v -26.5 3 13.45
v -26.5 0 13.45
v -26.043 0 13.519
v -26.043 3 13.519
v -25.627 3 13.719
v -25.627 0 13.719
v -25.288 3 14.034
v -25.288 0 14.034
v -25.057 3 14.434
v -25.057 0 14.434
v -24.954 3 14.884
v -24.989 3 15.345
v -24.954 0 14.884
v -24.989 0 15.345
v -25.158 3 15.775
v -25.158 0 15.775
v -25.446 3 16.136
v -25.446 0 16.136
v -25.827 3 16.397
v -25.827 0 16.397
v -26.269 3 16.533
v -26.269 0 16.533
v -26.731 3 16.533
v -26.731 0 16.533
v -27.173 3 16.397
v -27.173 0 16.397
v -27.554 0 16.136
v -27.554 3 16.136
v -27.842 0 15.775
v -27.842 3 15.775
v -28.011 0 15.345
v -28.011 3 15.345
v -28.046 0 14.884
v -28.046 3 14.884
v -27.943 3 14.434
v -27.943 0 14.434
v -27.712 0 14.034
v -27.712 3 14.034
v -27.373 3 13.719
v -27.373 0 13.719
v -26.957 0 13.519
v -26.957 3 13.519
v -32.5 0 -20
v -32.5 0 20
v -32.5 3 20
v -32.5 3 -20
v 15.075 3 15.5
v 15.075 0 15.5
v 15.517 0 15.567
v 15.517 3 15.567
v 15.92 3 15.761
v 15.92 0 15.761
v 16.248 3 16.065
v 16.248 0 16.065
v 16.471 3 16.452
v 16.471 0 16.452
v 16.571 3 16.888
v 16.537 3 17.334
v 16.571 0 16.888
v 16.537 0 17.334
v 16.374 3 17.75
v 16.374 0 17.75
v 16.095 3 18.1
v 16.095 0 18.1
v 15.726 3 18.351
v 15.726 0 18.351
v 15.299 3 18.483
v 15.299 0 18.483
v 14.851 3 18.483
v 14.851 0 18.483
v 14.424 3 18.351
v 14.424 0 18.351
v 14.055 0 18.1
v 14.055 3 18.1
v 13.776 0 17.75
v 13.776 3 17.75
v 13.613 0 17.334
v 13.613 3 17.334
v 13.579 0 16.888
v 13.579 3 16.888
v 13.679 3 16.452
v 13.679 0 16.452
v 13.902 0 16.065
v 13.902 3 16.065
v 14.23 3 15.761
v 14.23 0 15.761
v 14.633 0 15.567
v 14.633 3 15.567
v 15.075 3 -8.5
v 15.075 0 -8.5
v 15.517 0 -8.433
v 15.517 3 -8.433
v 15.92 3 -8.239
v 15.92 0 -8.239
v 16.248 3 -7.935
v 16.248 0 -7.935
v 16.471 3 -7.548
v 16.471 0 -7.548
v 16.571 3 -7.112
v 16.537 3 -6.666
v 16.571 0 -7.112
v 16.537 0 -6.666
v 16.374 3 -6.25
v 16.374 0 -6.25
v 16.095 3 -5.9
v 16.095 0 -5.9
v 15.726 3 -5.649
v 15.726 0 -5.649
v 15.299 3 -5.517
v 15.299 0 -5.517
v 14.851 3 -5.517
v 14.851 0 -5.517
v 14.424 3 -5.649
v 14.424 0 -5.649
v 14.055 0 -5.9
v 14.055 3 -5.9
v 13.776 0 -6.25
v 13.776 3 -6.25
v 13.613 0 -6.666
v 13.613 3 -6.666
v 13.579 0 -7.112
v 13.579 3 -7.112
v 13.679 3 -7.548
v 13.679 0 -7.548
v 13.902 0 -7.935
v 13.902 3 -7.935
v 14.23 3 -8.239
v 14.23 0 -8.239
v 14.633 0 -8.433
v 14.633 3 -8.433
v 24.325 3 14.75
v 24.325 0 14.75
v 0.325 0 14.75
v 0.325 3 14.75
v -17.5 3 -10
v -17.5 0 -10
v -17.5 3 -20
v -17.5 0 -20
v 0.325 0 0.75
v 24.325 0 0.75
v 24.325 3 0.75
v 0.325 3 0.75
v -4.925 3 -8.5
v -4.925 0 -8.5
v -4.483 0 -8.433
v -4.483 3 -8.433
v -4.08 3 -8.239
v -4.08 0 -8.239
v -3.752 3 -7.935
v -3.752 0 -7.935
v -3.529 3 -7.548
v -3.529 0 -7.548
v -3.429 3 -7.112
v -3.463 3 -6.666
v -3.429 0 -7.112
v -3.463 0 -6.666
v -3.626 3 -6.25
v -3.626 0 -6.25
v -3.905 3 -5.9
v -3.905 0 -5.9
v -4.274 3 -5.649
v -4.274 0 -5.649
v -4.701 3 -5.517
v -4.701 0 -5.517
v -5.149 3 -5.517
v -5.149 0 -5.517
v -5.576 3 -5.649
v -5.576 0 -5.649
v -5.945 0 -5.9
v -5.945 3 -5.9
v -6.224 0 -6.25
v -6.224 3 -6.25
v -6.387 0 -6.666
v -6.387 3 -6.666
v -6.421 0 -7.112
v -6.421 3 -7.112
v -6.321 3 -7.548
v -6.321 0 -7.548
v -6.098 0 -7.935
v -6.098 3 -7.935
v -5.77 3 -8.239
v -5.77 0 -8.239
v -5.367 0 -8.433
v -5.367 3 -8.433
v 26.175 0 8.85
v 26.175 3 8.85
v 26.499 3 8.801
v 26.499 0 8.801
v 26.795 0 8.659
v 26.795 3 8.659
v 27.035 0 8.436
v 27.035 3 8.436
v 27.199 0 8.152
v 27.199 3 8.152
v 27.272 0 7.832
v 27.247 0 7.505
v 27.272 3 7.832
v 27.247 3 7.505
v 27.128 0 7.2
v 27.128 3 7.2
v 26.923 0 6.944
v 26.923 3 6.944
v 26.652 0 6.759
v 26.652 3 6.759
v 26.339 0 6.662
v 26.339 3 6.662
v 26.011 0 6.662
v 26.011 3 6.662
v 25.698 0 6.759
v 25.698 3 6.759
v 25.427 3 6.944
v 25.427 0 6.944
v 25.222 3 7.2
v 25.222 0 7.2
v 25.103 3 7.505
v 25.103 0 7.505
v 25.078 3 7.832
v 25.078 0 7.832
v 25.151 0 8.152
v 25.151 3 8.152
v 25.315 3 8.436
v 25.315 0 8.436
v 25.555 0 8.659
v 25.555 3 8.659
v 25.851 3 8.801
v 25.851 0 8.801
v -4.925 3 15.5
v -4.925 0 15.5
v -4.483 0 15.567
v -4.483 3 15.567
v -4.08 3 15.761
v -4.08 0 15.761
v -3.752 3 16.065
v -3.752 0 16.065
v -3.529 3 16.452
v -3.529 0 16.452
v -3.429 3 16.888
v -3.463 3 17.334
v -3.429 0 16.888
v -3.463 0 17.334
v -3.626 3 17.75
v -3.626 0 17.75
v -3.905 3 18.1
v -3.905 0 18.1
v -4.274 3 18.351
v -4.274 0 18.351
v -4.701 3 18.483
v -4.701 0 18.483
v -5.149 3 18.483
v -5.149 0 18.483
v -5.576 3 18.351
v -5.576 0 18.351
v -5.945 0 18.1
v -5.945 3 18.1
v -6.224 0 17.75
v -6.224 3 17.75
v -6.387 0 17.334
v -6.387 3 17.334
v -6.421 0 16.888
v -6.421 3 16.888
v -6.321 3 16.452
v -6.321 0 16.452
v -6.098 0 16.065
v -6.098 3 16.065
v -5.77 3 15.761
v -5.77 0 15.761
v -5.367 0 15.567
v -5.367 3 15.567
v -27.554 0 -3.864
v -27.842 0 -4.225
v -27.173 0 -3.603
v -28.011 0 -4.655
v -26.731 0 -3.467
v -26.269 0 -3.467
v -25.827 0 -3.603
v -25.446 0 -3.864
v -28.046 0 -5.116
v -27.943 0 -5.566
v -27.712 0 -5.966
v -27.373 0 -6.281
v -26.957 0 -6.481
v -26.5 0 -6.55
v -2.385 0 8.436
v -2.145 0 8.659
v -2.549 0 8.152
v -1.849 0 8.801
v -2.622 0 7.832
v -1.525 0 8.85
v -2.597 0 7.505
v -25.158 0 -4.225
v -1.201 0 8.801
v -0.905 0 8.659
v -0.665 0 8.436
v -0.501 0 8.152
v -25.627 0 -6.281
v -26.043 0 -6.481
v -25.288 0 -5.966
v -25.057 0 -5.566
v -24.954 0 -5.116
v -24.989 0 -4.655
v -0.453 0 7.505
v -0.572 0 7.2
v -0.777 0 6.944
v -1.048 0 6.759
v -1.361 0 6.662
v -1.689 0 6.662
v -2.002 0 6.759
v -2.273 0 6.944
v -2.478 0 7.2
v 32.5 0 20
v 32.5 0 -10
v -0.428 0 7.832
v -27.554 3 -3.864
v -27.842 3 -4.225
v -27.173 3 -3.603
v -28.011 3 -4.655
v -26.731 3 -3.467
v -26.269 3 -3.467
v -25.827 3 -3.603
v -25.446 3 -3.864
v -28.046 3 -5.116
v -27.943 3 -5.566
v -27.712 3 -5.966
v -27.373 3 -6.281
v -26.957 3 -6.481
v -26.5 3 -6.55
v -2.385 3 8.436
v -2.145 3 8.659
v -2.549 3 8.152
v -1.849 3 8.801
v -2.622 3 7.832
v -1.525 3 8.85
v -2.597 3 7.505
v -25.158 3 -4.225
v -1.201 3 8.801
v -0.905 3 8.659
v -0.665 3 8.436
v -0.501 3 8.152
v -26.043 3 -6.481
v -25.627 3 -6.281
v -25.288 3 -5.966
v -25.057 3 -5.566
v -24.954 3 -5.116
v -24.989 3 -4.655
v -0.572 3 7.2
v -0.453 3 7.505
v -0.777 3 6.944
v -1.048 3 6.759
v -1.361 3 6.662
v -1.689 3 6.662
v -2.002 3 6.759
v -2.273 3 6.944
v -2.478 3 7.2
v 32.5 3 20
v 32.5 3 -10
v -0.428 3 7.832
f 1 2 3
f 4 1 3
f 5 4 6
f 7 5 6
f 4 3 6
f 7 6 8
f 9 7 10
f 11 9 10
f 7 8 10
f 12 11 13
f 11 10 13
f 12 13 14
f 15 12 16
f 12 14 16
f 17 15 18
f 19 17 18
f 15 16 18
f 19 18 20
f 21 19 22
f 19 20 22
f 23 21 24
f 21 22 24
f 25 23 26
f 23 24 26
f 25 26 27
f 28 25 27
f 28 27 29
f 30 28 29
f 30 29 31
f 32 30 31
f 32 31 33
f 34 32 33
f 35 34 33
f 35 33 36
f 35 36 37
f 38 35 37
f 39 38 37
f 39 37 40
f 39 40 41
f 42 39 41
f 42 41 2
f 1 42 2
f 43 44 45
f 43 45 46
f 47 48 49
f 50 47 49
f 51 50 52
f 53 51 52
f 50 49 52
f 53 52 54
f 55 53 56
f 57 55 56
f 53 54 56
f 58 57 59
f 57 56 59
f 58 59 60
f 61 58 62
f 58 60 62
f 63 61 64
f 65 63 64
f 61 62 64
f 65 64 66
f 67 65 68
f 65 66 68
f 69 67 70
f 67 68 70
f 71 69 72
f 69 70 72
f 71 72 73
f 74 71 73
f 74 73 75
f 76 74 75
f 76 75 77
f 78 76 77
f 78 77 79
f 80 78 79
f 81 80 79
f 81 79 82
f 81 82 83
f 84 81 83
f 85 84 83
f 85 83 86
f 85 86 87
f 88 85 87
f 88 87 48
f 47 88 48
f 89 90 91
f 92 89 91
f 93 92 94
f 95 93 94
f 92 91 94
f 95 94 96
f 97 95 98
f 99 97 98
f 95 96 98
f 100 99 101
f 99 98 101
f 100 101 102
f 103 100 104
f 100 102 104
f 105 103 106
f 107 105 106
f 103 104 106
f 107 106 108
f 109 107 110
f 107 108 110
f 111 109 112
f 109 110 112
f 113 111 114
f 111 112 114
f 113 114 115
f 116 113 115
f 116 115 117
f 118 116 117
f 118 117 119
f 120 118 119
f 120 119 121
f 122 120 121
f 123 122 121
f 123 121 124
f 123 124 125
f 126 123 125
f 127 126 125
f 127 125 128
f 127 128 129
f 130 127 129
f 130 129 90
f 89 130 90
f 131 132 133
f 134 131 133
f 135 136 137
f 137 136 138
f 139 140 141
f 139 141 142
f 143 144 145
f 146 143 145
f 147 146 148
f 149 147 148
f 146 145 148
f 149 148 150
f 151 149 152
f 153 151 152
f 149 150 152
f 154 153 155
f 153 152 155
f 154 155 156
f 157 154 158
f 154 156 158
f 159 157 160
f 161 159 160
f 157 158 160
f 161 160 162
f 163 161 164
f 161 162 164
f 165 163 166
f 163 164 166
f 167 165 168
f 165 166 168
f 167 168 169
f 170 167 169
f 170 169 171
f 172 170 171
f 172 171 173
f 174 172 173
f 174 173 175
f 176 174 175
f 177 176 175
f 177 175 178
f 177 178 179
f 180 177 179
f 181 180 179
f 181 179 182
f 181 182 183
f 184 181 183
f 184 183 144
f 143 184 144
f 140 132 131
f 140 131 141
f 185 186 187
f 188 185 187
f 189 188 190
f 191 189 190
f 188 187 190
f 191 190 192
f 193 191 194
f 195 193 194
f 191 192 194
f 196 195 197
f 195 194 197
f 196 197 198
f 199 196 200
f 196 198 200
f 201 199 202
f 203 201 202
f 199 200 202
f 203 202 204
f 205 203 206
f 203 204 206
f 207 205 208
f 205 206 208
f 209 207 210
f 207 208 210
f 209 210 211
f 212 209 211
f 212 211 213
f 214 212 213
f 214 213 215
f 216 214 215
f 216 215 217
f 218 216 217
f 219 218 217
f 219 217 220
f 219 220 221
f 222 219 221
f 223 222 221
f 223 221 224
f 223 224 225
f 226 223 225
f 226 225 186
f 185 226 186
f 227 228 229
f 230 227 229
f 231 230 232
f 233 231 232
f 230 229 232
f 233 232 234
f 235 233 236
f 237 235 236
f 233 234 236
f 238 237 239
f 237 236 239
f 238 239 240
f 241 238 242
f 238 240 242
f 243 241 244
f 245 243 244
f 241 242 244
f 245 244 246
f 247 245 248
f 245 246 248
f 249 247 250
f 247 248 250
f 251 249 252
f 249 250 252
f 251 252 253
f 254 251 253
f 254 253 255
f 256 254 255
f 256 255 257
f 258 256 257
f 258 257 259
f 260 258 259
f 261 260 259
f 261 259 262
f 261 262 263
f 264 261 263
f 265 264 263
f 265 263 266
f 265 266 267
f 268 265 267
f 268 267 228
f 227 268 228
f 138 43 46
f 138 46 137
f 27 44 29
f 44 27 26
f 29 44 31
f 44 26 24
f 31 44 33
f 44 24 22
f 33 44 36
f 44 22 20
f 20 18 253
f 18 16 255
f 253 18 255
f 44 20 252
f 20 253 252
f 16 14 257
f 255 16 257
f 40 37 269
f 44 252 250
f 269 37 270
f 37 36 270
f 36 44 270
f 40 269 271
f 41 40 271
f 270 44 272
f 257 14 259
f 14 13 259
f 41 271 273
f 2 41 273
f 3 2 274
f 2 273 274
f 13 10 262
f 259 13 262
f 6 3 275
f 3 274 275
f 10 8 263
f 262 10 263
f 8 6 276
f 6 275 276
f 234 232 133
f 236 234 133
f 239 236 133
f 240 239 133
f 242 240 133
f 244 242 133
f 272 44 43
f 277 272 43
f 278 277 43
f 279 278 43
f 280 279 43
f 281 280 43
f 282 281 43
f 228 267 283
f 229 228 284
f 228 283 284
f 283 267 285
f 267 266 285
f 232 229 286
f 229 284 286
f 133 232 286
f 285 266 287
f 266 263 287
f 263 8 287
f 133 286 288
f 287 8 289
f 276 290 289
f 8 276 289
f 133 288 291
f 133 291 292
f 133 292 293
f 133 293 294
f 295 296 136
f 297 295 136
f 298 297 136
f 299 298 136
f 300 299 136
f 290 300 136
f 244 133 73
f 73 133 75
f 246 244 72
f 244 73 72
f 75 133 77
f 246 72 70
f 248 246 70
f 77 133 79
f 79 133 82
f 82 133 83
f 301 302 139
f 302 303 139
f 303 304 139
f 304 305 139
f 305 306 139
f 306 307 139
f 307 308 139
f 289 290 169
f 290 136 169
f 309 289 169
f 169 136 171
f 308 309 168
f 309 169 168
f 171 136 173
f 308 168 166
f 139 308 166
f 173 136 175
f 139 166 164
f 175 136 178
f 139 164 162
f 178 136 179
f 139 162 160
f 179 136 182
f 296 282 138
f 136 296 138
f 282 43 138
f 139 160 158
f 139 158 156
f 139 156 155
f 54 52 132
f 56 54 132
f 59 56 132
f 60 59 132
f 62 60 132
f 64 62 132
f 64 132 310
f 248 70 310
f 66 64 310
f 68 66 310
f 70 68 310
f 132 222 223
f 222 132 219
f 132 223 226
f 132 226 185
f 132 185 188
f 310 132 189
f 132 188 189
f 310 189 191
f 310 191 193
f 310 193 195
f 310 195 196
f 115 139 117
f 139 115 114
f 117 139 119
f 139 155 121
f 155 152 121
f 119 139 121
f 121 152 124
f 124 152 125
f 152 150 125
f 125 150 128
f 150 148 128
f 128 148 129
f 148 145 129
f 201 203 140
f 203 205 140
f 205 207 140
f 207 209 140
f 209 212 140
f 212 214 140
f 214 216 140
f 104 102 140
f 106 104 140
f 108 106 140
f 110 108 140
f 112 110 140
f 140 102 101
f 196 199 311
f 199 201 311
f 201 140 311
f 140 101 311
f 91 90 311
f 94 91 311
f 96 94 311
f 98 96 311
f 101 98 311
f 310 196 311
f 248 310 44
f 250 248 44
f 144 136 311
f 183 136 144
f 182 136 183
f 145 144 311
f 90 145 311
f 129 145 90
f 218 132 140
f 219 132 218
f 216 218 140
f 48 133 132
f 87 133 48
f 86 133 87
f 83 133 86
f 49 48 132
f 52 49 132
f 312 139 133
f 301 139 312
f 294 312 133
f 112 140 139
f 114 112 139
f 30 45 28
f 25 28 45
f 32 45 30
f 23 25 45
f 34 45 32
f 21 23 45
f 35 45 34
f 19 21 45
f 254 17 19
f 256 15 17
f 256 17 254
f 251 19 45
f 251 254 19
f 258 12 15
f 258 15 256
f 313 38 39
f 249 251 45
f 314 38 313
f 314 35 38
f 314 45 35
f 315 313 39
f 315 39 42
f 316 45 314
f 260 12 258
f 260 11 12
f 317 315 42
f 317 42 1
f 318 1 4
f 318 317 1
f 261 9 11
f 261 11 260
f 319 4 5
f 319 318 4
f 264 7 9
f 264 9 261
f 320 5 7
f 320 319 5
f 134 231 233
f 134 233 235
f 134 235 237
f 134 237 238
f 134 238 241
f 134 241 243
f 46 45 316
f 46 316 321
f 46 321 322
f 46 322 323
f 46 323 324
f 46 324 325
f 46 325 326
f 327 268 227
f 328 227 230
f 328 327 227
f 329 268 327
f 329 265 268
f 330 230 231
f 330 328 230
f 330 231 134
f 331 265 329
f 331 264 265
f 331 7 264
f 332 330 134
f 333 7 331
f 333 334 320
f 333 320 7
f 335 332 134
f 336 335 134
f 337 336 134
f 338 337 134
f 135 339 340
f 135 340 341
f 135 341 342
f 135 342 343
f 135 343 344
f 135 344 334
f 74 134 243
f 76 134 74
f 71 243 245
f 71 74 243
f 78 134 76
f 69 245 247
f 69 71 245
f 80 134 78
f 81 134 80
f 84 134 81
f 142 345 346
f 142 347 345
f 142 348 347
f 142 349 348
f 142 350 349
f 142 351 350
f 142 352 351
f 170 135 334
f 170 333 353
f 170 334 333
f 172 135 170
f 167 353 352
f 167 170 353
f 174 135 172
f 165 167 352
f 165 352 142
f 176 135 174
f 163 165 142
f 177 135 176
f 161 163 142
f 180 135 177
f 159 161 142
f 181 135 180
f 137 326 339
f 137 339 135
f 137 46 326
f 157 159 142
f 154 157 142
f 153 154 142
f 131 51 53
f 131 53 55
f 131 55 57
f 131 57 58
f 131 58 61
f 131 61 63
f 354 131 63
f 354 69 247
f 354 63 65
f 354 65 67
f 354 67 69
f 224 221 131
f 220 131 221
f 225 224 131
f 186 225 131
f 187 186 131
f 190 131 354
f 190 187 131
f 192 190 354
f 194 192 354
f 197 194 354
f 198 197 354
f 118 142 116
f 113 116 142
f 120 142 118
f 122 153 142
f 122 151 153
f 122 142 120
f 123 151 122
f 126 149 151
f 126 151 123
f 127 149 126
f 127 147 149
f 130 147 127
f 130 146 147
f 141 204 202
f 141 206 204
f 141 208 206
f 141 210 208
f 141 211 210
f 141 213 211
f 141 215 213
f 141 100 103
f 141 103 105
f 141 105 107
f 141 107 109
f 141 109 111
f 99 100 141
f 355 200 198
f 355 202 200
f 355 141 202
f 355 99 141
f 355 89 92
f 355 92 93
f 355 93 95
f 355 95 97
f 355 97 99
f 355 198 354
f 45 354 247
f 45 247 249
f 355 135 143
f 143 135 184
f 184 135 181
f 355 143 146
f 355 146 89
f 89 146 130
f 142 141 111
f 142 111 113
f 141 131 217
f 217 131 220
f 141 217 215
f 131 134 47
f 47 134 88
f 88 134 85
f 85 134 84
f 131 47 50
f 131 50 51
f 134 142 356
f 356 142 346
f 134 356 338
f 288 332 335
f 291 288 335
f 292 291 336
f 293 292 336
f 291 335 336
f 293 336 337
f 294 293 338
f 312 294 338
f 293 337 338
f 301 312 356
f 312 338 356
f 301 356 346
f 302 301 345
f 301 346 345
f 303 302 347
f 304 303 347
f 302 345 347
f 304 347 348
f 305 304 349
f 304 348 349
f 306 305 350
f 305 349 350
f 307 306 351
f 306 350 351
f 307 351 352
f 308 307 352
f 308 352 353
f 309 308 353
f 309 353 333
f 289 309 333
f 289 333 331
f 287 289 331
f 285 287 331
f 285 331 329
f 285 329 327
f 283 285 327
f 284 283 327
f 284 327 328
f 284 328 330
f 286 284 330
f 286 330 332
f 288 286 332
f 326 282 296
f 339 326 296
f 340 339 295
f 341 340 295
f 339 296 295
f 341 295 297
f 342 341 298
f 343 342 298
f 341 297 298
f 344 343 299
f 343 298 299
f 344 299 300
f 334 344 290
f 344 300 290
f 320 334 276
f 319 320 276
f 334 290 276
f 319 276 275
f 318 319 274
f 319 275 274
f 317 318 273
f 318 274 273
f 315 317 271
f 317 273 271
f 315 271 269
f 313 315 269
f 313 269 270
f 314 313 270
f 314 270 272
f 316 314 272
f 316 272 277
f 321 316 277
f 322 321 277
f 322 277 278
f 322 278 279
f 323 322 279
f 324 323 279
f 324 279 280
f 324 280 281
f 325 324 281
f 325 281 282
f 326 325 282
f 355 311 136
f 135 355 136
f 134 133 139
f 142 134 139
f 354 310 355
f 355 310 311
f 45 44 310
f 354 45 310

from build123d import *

# Parameters (mm, degrees)
SKETCH_1_W          = 65
SKETCH_1_H          = 40
EXTRUDE_1_DEPTH     = 3
SKETCH_2_R          = 1.55
CUT_EXTRUDE_1_DEPTH = 10
SKETCH_3_W          = 50
SKETCH_3_H          = 10
CUT_EXTRUDE_2_DEPTH = 10
SKETCH_4_W          = 24
SKETCH_4_H          = 14
CUT_EXTRUDE_3_DEPTH = 10
SKETCH_5_R          = 1.1
CUT_EXTRUDE_4_DEPTH = 10
SKETCH_6_R          = 1.5
CUT_EXTRUDE_5_DEPTH = 25


with BuildPart() as part:
    # 草图1 → 凸台-拉伸1 (new body)
    with BuildSketch(Plane(origin=(0, 0, 0), x_dir=(1, 0, 0), z_dir=(0, 1, 0))):
        Rectangle(SKETCH_1_W, SKETCH_1_H)
    extrude(amount=EXTRUDE_1_DEPTH)

    # 草图2 → 切除-拉伸1 (cut)
    with BuildSketch(Plane(origin=(0, 0, 0), x_dir=(-1, 0, 0), z_dir=(0, -1, 0))):
        with Locations(Location((26.5, -15, 0), (0, 0, 90))):
            Circle(SKETCH_2_R)
        with Locations(Location((26.5, 5, 0), (0, 0, 90))):
            Circle(SKETCH_2_R)
    extrude(amount=-CUT_EXTRUDE_1_DEPTH, mode=Mode.SUBTRACT)

    # 草图3 → 切除-拉伸2 (cut)
    with BuildSketch(Plane(origin=(0, 0, 0), x_dir=(-1, 0, 0), z_dir=(0, -1, 0))):
        with Locations((-7.5, 15)):
            Rectangle(SKETCH_3_W, SKETCH_3_H)
    extrude(amount=-CUT_EXTRUDE_2_DEPTH, mode=Mode.SUBTRACT)

    # 草图4 → 切除-拉伸3 (cut)
    with BuildSketch(Plane(origin=(0, 0, 0), x_dir=(-1, 0, 0), z_dir=(0, -1, 0))):
        with Locations((-12.32495, -7.75)):
            Rectangle(SKETCH_4_W, SKETCH_4_H)
    extrude(amount=-CUT_EXTRUDE_3_DEPTH, mode=Mode.SUBTRACT)

    # 草图5 → 切除-拉伸4 (cut)
    with BuildSketch(Plane(origin=(0, 3, 0), x_dir=(1, 0, 0), z_dir=(0, 1, 0))):
        with Locations(Location((26.17495, -7.75, 0), (0, 0, 270))):
            Circle(SKETCH_5_R)
        with Locations(Location((-1.52505, -7.75, 0), (0, 0, 270))):
            Circle(SKETCH_5_R)
    extrude(amount=-CUT_EXTRUDE_4_DEPTH, mode=Mode.SUBTRACT)

    # 草图6 → 切除-拉伸5 (cut)
    with BuildSketch(Plane(origin=(0, 0, 0), x_dir=(-1, 0, 0), z_dir=(0, -1, 0))):
        with Locations(Location((-15.074975, -17, 0), (0, 0, 90))):
            Circle(SKETCH_6_R)
        with Locations(Location((4.925025, -17, 0), (0, 0, 90))):
            Circle(SKETCH_6_R)
        with Locations(Location((-15.074975, 7, 0), (0, 0, 90))):
            Circle(SKETCH_6_R)
        with Locations(Location((4.925025, 7, 0), (0, 0, 90))):
            Circle(SKETCH_6_R)
    extrude(amount=-CUT_EXTRUDE_5_DEPTH, mode=Mode.SUBTRACT)


solid = part.part
